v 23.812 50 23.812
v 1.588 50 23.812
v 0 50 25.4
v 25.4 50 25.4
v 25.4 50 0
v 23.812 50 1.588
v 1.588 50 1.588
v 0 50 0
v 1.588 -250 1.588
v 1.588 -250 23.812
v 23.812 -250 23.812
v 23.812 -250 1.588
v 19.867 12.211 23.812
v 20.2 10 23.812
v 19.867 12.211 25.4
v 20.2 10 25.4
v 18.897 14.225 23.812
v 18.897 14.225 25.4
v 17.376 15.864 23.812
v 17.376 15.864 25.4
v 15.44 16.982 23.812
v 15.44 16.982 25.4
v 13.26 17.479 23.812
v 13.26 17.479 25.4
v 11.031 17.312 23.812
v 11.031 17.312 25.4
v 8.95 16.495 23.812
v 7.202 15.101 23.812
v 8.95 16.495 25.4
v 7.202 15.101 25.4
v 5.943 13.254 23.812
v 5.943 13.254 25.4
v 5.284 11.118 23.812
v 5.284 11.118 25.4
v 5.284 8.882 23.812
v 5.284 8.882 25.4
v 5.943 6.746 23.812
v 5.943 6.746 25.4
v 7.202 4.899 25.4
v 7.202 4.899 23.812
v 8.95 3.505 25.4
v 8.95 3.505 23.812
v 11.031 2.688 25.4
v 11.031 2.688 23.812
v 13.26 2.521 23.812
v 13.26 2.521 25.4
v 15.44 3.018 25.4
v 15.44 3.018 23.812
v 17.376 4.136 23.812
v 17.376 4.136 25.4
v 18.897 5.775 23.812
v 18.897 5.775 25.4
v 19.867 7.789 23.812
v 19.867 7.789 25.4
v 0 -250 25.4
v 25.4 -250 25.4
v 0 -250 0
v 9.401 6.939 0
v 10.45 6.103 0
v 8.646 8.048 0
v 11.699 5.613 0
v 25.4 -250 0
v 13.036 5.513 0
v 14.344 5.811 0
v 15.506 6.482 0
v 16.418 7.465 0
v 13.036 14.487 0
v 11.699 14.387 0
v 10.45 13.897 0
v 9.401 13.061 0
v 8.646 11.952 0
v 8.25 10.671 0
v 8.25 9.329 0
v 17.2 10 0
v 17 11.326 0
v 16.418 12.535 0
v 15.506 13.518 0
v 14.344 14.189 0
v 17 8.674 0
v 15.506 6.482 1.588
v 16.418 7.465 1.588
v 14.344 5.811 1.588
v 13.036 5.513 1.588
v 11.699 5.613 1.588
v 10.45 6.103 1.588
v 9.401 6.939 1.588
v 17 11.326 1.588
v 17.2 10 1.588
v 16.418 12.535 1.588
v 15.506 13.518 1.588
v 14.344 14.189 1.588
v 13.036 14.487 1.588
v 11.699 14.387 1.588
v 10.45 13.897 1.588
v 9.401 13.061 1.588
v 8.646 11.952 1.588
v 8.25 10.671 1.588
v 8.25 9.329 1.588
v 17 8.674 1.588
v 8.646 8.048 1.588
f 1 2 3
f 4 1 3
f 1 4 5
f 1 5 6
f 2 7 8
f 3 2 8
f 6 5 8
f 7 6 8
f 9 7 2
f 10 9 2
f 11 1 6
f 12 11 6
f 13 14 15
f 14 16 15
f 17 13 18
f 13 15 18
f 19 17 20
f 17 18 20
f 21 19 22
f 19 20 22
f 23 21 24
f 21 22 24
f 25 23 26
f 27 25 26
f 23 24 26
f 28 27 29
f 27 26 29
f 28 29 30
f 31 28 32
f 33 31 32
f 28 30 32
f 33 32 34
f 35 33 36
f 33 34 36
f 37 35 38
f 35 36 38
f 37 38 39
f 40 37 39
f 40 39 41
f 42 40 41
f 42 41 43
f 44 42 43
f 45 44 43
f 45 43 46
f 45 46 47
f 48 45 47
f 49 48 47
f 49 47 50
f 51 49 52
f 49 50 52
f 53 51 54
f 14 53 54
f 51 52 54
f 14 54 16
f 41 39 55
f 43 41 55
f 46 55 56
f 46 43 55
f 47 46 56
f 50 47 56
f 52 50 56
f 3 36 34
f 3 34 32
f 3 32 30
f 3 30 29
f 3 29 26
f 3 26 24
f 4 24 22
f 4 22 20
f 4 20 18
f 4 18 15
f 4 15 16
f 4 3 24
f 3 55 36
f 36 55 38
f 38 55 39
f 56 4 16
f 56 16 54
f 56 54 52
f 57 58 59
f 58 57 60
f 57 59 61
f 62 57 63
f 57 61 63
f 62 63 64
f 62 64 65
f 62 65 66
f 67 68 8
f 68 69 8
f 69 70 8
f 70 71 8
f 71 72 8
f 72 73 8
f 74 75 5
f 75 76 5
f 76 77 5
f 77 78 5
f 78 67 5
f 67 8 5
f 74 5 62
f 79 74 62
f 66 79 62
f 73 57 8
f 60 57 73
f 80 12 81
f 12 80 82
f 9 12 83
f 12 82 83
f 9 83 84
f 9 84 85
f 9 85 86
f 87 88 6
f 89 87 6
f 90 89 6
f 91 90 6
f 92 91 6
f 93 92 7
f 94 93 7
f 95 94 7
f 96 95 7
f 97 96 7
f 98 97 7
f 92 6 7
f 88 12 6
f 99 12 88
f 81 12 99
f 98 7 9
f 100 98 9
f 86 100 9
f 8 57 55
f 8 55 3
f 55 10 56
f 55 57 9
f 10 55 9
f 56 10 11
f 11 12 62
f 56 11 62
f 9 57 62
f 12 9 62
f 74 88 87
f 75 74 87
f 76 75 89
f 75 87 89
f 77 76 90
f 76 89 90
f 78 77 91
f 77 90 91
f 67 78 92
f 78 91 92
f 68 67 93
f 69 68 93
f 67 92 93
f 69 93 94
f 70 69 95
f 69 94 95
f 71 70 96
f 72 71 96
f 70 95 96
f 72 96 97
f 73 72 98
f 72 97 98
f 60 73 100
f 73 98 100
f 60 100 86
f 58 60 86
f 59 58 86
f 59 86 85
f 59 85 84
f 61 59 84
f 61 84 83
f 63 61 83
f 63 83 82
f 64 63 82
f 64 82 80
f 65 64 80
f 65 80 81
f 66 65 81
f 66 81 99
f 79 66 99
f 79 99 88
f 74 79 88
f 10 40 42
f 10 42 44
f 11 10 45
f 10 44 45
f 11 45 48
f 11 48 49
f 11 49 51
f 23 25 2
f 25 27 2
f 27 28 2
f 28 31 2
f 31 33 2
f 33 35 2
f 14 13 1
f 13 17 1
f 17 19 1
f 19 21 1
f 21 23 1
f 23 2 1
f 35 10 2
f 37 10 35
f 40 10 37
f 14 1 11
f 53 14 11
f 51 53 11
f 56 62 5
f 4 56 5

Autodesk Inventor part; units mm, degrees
ref_plane "YZ Plane" through (0, 0, 0) normal (1, 0, 0) x (0, 1, 0)
ref_plane "XZ Plane" through (0, 0, 0) normal (0, 1, 0) x (-1, 0, 0)
ref_plane "XY Plane" through (0, 0, 0) normal (0, 0, 1) x (1, 0, 0)
sketch "Sketch1" plane through (0, 0, 0) normal (0, 0, 1) x (1, 0, 0)
  line L0 (0, 0) -> (25.4, 0) projected
  line L1 (25.4, 0) -> (25.4, 500) projected
  line L2 (0, 500) -> (25.4, 500) projected
  line L3 (0, 0) -> (0, 500) projected
  line L4 (23.8125, 0) -> (23.8125, 500) projected
  line L5 (1.5875, 0) -> (1.5875, 500) projected
  line L6 (25.4, 50) -> (0, 50)
  line L7 (0, 50) -> (0, -250)
  line L8 (0, -250) -> (25.4, -250)
  line L9 (25.4, -250) -> (25.4, 50)
  dimension "d0" = 50
  dimension "d1" = 300
extrude "Extrusion1" add sketch "Sketch1" along normal blind 25.4 contours L3 L6 L5 L0 | L0 L9 L8 L7 | L5 L6 L4 L0 | L4 L6 L1 L0
sketch "Sketch2" plane through (0, 50, 0) normal (0, 1, 0) x (1, 0, 0)
  line L0 (23.8125, -1.5875) -> (1.5875, -1.5875)
  line L1 (1.5875, -1.5875) -> (1.5875, -23.8125)
  line L2 (1.5875, -23.8125) -> (23.8125, -23.8125)
  line L3 (23.8125, -23.8125) -> (23.8125, -1.5875)
  line L4 (23.8125, 23.8125) -> (23.8125, 1.5875) projected
  line L5 (1.5875, 1.5875) -> (1.5875, 23.8125) projected
  line L6 (25.4, -25.4) -> (0, -25.4) projected
  point P0 (0, 0)
  dimension "d4" = 22.225
  dimension "d5" = 1.5875
extrude "Extrusion2" cut sketch "Sketch2" against normal up to next
sketch "Sketch3" plane through (0, 0, 25.4) normal (0, 0, 1) x (1, 0, 0)
  circle A0 centre (12.7, 10) radius 7.5
  line L0 (25.4, -250) -> (25.4, 50) projected
  line L1 (0, 0) -> (25.4, 0) projected
  line L2 (0, 0) -> (25.4, 0) projected
  line L3 (23.8125, 15.05) -> (1.5875, 15.05)
  dimension "d8" = 15
  dimension "d9" = 12.7
  dimension "d10" = 10
extrude "Extrusion3" cut sketch "Sketch3" against normal up to next
sketch "Sketch4" plane through (1.5875, 50, 1.5875) normal (0, 0, 1) x (1, 0, 0)
  circle A0 centre (11.1125, -40) radius 7.5 projected
  circle A1 centre (11.1125, -40) radius 4.5
  point P0 (-1.5875, -50)
  dimension "d13" = 9
extrude "Extrusion4" cut sketch "Sketch4" against normal up to next contours A1
properties part number "CounterWeight"
